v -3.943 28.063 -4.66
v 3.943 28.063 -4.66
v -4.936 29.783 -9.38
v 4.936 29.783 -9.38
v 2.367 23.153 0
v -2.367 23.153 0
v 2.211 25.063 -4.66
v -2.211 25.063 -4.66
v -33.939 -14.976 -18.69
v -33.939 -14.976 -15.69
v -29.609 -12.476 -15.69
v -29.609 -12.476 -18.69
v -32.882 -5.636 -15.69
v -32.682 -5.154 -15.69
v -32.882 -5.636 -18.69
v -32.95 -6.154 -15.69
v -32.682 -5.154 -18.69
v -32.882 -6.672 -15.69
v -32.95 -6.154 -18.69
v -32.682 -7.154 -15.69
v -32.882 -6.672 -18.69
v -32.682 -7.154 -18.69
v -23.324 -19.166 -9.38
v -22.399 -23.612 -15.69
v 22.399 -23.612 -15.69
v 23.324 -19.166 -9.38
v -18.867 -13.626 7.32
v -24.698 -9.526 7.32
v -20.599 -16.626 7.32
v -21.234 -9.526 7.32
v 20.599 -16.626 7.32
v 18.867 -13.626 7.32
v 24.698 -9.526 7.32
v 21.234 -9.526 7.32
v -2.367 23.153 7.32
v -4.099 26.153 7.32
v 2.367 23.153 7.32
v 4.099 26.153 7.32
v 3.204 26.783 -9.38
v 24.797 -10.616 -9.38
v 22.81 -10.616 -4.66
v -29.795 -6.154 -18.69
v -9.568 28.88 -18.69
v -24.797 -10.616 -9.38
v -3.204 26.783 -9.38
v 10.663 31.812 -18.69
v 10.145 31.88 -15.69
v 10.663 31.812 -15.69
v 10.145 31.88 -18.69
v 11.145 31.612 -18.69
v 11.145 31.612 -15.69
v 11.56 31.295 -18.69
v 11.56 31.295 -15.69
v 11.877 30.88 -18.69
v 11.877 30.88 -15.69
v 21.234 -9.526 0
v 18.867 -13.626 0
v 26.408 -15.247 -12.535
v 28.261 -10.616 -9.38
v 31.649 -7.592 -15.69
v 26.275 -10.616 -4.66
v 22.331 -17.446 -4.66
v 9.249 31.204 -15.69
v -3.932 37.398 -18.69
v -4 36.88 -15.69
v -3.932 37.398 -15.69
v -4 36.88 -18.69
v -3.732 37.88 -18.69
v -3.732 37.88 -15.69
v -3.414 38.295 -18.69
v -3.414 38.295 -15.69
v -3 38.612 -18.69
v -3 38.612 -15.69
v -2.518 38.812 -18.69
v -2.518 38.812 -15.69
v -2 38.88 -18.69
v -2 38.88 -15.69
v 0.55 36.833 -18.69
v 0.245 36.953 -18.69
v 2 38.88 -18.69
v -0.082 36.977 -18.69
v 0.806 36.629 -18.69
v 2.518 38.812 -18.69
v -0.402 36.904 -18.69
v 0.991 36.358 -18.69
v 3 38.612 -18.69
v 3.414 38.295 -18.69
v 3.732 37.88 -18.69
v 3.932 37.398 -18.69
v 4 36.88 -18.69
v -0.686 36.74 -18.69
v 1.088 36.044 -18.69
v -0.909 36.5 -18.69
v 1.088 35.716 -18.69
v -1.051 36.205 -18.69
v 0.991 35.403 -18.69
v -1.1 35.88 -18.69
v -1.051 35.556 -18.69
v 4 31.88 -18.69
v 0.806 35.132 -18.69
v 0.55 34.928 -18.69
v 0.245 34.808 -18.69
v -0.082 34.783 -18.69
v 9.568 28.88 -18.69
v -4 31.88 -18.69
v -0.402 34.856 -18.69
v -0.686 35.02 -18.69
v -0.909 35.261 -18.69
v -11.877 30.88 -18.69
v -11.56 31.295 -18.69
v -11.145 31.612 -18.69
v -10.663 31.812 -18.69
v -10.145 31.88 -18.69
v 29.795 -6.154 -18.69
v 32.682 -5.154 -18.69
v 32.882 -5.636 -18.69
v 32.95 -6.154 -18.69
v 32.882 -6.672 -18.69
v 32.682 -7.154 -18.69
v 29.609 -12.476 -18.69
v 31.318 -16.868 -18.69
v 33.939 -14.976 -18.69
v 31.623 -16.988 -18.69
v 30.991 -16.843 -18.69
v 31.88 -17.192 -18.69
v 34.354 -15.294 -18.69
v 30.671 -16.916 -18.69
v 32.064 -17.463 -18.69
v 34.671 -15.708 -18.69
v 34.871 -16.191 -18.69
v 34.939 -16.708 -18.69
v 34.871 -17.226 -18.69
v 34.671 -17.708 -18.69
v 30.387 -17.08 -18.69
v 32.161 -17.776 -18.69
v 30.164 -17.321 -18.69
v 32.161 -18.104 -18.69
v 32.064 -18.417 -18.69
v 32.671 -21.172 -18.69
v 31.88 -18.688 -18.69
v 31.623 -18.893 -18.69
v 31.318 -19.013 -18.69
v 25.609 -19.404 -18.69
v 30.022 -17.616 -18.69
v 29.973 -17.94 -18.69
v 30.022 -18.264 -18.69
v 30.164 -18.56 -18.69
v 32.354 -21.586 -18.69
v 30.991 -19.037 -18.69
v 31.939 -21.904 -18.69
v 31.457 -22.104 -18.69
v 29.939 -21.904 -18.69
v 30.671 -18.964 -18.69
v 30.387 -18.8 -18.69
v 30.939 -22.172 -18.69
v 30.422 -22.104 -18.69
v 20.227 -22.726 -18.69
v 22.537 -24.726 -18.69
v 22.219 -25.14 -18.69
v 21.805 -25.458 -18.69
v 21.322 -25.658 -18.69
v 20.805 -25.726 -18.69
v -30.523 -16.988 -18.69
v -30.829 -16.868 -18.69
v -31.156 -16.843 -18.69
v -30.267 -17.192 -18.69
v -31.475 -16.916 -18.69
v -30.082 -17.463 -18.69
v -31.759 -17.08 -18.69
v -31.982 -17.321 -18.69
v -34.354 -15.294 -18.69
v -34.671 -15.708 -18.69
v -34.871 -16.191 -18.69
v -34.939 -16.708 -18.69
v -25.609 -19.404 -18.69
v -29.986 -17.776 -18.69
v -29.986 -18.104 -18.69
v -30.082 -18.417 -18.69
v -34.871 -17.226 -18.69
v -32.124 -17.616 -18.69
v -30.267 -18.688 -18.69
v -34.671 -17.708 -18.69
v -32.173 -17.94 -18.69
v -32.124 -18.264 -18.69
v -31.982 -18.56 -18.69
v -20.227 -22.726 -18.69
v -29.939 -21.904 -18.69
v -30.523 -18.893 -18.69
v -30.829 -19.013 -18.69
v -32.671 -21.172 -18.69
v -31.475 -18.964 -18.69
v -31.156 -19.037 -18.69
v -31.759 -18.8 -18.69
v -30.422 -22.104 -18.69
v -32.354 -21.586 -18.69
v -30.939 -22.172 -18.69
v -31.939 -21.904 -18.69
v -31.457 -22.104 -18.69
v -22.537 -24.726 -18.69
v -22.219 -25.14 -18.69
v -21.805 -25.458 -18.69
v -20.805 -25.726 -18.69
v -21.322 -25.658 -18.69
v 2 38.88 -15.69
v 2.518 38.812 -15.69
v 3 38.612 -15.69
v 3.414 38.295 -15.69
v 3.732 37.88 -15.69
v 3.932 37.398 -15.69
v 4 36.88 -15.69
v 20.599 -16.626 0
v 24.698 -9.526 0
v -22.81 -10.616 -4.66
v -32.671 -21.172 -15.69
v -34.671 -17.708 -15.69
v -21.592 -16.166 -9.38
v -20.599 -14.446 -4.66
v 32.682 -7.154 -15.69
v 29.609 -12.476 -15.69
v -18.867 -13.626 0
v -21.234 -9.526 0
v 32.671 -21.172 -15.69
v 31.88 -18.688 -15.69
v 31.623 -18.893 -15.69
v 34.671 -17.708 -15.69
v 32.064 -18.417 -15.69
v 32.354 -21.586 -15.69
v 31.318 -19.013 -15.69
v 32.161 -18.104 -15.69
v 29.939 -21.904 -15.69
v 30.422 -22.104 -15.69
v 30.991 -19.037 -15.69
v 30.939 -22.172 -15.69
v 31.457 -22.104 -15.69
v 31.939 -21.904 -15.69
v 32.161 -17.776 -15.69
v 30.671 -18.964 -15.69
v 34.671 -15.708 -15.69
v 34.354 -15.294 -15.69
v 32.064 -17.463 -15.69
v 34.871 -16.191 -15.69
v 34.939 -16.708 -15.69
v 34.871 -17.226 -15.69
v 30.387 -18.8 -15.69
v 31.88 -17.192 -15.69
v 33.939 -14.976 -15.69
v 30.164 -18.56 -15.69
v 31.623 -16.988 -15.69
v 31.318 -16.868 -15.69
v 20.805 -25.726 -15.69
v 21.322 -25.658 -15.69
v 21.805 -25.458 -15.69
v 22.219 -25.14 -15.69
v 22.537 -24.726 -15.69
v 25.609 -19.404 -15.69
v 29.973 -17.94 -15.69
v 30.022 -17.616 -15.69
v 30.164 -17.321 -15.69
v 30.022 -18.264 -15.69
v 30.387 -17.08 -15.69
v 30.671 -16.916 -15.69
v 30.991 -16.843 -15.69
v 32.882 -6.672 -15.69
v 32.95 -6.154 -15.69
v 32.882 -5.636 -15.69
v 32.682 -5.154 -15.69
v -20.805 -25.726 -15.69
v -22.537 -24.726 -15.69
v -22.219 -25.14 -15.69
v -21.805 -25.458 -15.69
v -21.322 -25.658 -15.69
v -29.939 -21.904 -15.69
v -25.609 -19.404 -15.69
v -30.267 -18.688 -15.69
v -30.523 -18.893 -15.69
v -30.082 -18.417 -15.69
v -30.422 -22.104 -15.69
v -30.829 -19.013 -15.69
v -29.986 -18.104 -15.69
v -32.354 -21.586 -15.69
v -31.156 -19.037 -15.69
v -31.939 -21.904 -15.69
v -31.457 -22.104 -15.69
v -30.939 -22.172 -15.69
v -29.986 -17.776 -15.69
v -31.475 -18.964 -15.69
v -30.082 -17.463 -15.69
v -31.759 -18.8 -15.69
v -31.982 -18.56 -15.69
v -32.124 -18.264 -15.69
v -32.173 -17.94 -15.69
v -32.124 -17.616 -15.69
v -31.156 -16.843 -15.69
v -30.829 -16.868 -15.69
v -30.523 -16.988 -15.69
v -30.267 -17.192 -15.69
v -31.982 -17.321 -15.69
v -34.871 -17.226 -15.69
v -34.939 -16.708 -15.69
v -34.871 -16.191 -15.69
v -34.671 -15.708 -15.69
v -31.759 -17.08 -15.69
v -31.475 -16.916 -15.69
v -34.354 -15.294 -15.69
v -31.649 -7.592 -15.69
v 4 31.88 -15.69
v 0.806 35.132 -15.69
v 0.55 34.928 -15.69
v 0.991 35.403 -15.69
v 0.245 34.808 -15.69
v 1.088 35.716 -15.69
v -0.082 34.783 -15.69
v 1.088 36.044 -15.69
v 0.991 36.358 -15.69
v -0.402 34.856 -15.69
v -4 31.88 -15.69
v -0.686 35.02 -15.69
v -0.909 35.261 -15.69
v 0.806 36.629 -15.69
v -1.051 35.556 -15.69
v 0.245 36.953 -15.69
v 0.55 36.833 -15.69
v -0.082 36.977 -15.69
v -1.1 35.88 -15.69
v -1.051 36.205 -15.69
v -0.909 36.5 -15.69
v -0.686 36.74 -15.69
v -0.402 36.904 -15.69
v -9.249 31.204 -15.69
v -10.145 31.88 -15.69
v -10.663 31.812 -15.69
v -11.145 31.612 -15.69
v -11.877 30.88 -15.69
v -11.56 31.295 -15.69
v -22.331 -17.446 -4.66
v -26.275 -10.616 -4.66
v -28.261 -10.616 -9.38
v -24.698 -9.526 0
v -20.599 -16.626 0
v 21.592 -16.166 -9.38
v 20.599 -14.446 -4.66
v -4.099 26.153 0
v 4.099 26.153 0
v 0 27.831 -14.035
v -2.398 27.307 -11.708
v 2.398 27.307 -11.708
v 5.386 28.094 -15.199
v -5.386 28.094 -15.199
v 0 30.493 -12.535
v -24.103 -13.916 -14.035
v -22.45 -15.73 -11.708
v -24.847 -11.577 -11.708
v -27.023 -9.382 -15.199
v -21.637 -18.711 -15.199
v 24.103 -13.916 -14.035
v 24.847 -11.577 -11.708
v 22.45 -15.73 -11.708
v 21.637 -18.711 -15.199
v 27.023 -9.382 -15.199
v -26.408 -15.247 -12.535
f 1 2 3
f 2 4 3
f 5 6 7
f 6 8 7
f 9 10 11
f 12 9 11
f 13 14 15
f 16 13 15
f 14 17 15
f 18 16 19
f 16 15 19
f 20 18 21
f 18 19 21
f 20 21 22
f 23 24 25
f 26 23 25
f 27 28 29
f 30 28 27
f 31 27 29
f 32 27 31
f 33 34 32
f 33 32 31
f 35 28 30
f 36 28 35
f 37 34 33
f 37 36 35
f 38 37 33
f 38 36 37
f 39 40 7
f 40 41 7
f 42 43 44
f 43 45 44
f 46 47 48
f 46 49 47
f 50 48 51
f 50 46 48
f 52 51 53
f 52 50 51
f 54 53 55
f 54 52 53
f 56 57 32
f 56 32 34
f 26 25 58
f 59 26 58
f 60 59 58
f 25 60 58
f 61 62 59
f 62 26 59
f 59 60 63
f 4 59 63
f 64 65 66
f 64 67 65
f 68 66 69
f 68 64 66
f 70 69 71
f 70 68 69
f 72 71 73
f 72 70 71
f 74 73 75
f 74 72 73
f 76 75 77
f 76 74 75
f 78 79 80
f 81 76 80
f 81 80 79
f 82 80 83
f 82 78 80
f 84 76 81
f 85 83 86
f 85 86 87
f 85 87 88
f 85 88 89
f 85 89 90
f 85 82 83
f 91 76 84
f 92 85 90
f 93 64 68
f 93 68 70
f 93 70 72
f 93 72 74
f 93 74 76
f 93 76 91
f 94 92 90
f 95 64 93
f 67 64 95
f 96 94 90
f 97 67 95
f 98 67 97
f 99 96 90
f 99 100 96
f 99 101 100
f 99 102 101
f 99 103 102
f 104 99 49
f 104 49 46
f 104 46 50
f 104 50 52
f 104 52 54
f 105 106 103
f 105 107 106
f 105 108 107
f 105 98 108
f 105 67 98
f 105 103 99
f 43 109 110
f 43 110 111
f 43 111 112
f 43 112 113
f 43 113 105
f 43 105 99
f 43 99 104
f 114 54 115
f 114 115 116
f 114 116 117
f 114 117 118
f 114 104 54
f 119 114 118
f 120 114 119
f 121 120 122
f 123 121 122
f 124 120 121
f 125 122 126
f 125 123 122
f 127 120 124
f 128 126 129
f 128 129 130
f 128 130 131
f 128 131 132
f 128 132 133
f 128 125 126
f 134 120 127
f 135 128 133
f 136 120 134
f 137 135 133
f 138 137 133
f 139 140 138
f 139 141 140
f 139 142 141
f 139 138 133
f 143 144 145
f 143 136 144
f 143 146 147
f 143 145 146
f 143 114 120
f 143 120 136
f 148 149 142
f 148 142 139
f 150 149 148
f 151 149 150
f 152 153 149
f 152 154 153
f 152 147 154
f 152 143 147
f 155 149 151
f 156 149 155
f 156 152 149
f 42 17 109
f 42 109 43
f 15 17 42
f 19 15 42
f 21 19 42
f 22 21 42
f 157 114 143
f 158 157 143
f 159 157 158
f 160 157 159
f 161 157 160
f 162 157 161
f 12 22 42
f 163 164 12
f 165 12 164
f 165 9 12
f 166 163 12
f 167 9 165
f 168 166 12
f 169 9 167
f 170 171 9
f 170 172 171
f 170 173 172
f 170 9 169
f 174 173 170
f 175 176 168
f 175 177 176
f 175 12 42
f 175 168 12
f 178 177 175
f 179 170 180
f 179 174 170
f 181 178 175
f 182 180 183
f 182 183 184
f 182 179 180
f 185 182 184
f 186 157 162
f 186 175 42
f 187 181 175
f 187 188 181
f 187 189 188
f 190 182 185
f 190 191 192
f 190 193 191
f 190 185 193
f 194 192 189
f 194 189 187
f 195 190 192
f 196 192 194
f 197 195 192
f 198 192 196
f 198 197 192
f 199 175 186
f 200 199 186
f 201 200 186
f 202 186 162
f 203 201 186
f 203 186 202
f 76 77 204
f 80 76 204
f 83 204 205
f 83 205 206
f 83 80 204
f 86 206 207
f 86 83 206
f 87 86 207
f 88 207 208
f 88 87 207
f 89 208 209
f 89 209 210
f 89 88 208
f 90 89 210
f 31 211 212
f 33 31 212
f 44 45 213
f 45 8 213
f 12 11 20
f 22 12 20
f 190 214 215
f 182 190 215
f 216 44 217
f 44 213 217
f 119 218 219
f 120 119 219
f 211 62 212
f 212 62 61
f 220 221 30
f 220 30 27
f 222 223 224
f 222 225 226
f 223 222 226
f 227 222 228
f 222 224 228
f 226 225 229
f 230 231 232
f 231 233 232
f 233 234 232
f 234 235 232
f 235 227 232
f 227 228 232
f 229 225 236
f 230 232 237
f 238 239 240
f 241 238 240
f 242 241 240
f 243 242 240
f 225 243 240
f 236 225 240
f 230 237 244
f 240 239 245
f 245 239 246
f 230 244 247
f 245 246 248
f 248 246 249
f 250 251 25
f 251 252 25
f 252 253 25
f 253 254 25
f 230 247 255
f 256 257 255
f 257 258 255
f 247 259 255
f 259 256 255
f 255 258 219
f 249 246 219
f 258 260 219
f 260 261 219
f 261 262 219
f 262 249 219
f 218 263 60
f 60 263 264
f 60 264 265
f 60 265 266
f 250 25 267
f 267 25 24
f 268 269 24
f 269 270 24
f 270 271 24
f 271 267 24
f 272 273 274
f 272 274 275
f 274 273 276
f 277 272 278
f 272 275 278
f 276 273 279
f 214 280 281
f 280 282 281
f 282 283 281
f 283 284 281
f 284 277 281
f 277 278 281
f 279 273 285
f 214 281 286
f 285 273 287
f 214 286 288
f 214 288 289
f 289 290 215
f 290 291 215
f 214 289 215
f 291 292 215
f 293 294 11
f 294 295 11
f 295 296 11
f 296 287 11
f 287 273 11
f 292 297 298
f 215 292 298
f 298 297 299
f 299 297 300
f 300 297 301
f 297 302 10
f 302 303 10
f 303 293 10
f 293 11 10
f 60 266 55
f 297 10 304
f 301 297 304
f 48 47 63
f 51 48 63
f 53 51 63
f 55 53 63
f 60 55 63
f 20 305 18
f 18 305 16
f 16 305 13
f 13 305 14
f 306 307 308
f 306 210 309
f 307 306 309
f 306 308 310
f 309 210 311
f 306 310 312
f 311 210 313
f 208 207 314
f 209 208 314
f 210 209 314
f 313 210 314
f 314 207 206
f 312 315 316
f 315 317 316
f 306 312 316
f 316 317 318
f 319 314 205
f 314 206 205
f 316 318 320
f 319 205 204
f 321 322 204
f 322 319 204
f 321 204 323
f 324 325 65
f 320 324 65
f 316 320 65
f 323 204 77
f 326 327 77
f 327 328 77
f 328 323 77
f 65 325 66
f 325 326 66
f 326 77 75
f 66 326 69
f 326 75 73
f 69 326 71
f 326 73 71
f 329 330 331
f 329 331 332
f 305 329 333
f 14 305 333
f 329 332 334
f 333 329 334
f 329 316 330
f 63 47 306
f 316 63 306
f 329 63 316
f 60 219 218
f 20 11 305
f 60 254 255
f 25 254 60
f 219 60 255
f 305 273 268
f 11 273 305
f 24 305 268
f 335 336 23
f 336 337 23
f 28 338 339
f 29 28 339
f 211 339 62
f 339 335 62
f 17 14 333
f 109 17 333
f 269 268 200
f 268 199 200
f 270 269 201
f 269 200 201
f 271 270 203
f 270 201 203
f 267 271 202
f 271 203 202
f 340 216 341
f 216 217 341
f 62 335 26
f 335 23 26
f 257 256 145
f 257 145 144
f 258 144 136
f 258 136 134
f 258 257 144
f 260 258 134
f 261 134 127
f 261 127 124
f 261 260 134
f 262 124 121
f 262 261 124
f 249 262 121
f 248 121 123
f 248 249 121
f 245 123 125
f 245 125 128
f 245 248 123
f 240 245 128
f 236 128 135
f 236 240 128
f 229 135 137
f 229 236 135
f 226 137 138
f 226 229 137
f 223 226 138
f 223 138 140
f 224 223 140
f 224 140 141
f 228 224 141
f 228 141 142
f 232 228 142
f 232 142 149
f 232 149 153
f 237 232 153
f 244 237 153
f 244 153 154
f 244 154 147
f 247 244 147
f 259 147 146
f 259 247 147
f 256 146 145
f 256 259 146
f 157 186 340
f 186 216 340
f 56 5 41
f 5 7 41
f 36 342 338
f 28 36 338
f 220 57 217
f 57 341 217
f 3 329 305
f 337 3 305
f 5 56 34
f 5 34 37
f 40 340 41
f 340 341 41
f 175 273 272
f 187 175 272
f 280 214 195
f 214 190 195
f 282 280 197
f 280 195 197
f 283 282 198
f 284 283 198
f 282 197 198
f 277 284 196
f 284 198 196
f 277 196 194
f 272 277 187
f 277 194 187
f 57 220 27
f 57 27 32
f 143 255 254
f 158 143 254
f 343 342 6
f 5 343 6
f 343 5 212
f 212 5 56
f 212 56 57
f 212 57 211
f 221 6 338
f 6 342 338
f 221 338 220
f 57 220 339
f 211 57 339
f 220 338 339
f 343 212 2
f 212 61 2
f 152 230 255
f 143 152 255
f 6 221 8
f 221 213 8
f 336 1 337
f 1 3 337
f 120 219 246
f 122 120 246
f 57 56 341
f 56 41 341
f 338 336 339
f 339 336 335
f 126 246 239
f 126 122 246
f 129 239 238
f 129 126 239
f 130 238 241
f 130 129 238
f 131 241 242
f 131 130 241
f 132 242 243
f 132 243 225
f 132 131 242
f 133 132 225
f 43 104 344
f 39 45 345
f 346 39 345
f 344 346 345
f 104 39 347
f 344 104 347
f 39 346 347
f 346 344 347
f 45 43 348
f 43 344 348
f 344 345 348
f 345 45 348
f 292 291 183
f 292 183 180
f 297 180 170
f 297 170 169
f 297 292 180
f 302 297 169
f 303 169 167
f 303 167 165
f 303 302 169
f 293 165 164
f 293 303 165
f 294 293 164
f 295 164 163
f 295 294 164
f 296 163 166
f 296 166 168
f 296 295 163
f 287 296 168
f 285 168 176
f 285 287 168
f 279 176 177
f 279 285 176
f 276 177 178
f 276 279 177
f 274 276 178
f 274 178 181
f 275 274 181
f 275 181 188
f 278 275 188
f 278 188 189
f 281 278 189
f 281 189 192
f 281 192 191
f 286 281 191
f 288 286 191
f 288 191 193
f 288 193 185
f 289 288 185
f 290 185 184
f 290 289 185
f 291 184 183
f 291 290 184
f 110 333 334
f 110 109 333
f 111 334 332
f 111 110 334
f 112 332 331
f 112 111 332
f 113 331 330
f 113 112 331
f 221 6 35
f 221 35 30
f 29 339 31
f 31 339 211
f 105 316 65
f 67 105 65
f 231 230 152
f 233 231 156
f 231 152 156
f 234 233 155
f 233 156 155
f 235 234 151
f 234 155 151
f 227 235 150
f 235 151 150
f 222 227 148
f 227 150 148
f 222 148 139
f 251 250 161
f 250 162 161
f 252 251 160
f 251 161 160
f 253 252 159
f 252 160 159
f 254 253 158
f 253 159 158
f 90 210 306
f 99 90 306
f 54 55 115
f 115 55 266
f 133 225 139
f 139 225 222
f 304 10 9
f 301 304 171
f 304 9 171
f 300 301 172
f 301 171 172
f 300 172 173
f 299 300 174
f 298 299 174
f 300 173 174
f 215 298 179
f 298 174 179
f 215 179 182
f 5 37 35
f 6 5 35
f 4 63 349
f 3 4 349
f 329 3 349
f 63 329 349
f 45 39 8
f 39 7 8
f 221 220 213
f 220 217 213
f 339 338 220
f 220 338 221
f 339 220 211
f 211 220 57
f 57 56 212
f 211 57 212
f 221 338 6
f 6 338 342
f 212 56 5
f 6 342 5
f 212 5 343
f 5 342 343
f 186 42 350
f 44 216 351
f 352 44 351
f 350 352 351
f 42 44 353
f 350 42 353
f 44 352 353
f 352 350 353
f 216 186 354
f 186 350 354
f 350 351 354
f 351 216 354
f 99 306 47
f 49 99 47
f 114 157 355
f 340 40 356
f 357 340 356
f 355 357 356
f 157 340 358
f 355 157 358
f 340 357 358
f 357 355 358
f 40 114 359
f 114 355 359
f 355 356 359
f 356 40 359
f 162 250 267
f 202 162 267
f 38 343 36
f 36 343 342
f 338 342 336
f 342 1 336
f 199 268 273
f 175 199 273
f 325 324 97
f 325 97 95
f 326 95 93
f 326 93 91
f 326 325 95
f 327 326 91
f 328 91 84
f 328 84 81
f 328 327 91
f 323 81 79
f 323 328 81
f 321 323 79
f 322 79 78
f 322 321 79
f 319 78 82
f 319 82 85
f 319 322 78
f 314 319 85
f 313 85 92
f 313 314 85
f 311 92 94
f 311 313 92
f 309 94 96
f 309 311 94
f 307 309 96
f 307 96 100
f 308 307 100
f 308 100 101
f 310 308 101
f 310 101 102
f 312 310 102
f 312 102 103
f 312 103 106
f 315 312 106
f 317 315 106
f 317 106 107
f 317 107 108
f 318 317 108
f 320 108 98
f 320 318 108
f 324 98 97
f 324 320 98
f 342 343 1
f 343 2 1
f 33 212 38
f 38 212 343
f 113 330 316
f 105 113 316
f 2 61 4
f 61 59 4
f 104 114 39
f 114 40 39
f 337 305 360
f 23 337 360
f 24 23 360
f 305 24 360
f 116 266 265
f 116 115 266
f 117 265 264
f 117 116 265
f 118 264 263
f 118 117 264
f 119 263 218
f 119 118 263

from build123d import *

# Parameters (mm, degrees)
BOSS_EXTRUDE1_DEPTH     = 7.32
BOSS_EXTRUDE6_START     = -3
BOSS_EXTRUDE6_OUTLINE_R = 1.1
BOSS_EXTRUDE6_DEPTH     = 3
FILLET2_R               = 2


# Read off the part's stored shape, not the designer's step: Boss-Extrude6
with BuildPart() as part:
    # Sketch1 → Boss-Extrude1 (new body)
    with BuildSketch(Plane.XY):
        Polygon((-20.599186911, -16.626279442), (20.599186911, -16.626279442), (24.698373822, -9.526279442), (4.099186911, 26.152558883), (-4.099186911, 26.152558883), (-24.698373822, -9.526279442), align=None)
        Polygon((18.867136104, -13.626279442), (21.234272207, -9.526279442), (2.367136104, 23.152558883), (-2.367136104, 23.152558883), (-21.234272207, -9.526279442), (-18.867136104, -13.626279442), align=None, mode=Mode.SUBTRACT)
    extrude(amount=BOSS_EXTRUDE1_DEPTH)


with BuildPart() as body_2:
    # Sketch1<14> → Loft3 section 0
    with BuildSketch(Plane.XY):
        with BuildLine():
            Line((-4.099186911, 26.152558883), (-24.698373822, -9.526279442))
            Line((-24.698373822, -9.526279442), (-20.599186911, -16.626279442))
            Line((-20.599186911, -16.626279442), (20.599186911, -16.626279442))
            Line((20.599186911, -16.626279442), (24.698373822, -9.526279442))
            Line((24.698373822, -9.526279442), (4.099186911, 26.152558883))
            Line((4.099186911, 26.152558883), (-4.099186911, 26.152558883))
        make_face()
    # Sketch5 → Loft3 section 1
    with BuildSketch(Plane.XY.offset(-4.66)):
        with BuildLine():
            Line((-3.943302339, 28.062558883), (-26.274540057, -10.616279442))
            Line((-26.274540057, -10.616279442), (-22.331237719, -17.446279442))
            Line((-22.331237719, -17.446279442), (22.331237719, -17.446279442))
            Line((22.331237719, -17.446279442), (26.274540057, -10.616279442))
            Line((26.274540057, -10.616279442), (3.943302339, 28.062558883))
            Line((3.943302339, 28.062558883), (-3.943302339, 28.062558883))
        make_face()
    loft()

    # Sketch5<46> → Loft4 section 0
    with BuildSketch(Plane.XY.offset(-4.66)):
        with BuildLine():
            Line((-3.943302339, 28.062558883), (-26.274540057, -10.616279442))
            Line((-26.274540057, -10.616279442), (-22.331237719, -17.446279442))
            Line((-22.331237719, -17.446279442), (22.331237719, -17.446279442))
            Line((22.331237719, -17.446279442), (26.274540057, -10.616279442))
            Line((26.274540057, -10.616279442), (3.943302339, 28.062558883))
            Line((3.943302339, 28.062558883), (-3.943302339, 28.062558883))
        make_face()
    # Sketch13 → Loft4 section 1
    with BuildSketch(Plane.XY.offset(-9.38)):
        with BuildLine():
            Line((-4.936344802, 29.782558883), (-28.260624983, -10.616279442))
            Line((-28.260624983, -10.616279442), (-23.324280182, -19.166279442))
            Line((-23.324280182, -19.166279442), (23.324280182, -19.166279442))
            Line((23.324280182, -19.166279442), (28.260624983, -10.616279442))
            Line((28.260624983, -10.616279442), (4.936344802, 29.782558883))
            Line((4.936344802, 29.782558883), (-4.936344802, 29.782558883))
        make_face()
    loft()

    # Sketch13<4> → Loft5 section 0
    with BuildSketch(Plane.XY.offset(-9.38)):
        with BuildLine():
            Line((-4.936344802, 29.782558883), (-28.260624983, -10.616279442))
            Line((-28.260624983, -10.616279442), (-23.324280182, -19.166279442))
            Line((-23.324280182, -19.166279442), (23.324280182, -19.166279442))
            Line((23.324280182, -19.166279442), (28.260624983, -10.616279442))
            Line((28.260624983, -10.616279442), (4.936344802, 29.782558883))
            Line((4.936344802, 29.782558883), (-4.936344802, 29.782558883))
        make_face()
    # Sketch14 → Loft5 section 1
    with BuildSketch(Plane.XY.offset(-18.69)):
        with BuildLine():
            Line((11.3, 31.880384758), (-11.3, 31.880384758))
            Line((-11.3, 31.880384758), (-33.259223083, -6.154105316))
            Line((-33.259223083, -6.154105316), (-21.959223083, -25.726279442))
            Line((-21.959223083, -25.726279442), (21.959223083, -25.726279442))
            Line((21.959223083, -25.726279442), (33.259223083, -6.154105316))
            Line((33.259223083, -6.154105316), (11.3, 31.880384758))
        make_face()
    loft()

    # Sketch1<15> → Cut-Loft1 section 0
    with BuildSketch(Plane.XY):
        with BuildLine():
            Line((-2.367136104, 23.152558883), (2.367136104, 23.152558883))
            Line((2.367136104, 23.152558883), (21.234272207, -9.526279442))
            Line((21.234272207, -9.526279442), (18.867136104, -13.626279442))
            Line((18.867136104, -13.626279442), (-18.867136104, -13.626279442))
            Line((-18.867136104, -13.626279442), (-21.234272207, -9.526279442))
            Line((-21.234272207, -9.526279442), (-2.367136104, 23.152558883))
        make_face()
    # Sketch5<47> → Cut-Loft1 section 1
    with BuildSketch(Plane.XY.offset(-4.66)):
        with BuildLine():
            Line((2.211251531, 25.062558883), (22.810438442, -10.616279442))
            Line((22.810438442, -10.616279442), (20.599186911, -14.446279442))
            Line((20.599186911, -14.446279442), (-20.599186911, -14.446279442))
            Line((-20.599186911, -14.446279442), (-22.810438442, -10.616279442))
            Line((-22.810438442, -10.616279442), (-2.211251531, 25.062558883))
            Line((-2.211251531, 25.062558883), (2.211251531, 25.062558883))
        make_face()
    loft(mode=Mode.SUBTRACT)

    # Sketch14<5> → Cut-Loft2 section 0
    with BuildSketch(Plane.XY.offset(-18.69)):
        with BuildLine():
            Line((29.795121467, -6.154105316), (9.567949192, 28.880384758))
            Line((9.567949192, 28.880384758), (-9.567949192, 28.880384758))
            Line((-9.567949192, 28.880384758), (-29.795121467, -6.154105316))
            Line((-29.795121467, -6.154105316), (-20.227172275, -22.726279442))
            Line((-20.227172275, -22.726279442), (20.227172275, -22.726279442))
            Line((20.227172275, -22.726279442), (29.795121467, -6.154105316))
        make_face()
    # Sketch13<5> → Cut-Loft2 section 1
    with BuildSketch(Plane.XY.offset(-9.38)):
        with BuildLine():
            Line((-24.796523368, -10.616279442), (-21.592229374, -16.166279442))
            Line((-21.592229374, -16.166279442), (21.592229374, -16.166279442))
            Line((21.592229374, -16.166279442), (24.796523368, -10.616279442))
            Line((24.796523368, -10.616279442), (3.204293994, 26.782558883))
            Line((3.204293994, 26.782558883), (-3.204293994, 26.782558883))
            Line((-3.204293994, 26.782558883), (-24.796523368, -10.616279442))
        make_face()
    loft(mode=Mode.SUBTRACT)

    # Sketch13<6> → Cut-Loft3 section 0
    with BuildSketch(Plane.XY.offset(-9.38)):
        with BuildLine():
            Line((-24.796523368, -10.616279442), (-21.592229374, -16.166279442))
            Line((-21.592229374, -16.166279442), (21.592229374, -16.166279442))
            Line((21.592229374, -16.166279442), (24.796523368, -10.616279442))
            Line((24.796523368, -10.616279442), (3.204293994, 26.782558883))
            Line((3.204293994, 26.782558883), (-3.204293994, 26.782558883))
            Line((-3.204293994, 26.782558883), (-24.796523368, -10.616279442))
        make_face()
    # Sketch5<48> → Cut-Loft3 section 1
    with BuildSketch(Plane.XY.offset(-4.66)):
        with BuildLine():
            Line((2.211251531, 25.062558883), (22.810438442, -10.616279442))
            Line((22.810438442, -10.616279442), (20.599186911, -14.446279442))
            Line((20.599186911, -14.446279442), (-20.599186911, -14.446279442))
            Line((-20.599186911, -14.446279442), (-22.810438442, -10.616279442))
            Line((-22.810438442, -10.616279442), (-2.211251531, 25.062558883))
            Line((-2.211251531, 25.062558883), (2.211251531, 25.062558883))
        make_face()
    loft(mode=Mode.SUBTRACT)

    # Boss-Extrude6 outline → Boss-Extrude6 (add)
    with BuildSketch(Plane(origin=(0, 0, -18.69), x_dir=(-1, 0, 0), z_dir=(0, 0, -1)).offset(BOSS_EXTRUDE6_START)):
        Polygon((33.259223083, -6.154105316), (11.3, 31.880384758), (4, 31.880384758), (4, 38.880384758), (-4, 38.880384758), (-4, 31.880384758), (-11.3, 31.880384758), (-33.259223083, -6.154105316), (-29.609223083, -12.476090764), (-35.671400909, -15.976090764), (-31.671400909, -22.904293994), (-25.609223083, -19.404293994), (-21.959223083, -25.726279442), (21.959223083, -25.726279442), (25.609223083, -19.404293994), (31.671400909, -22.904293994), (35.671400909, -15.976090764), (29.609223083, -12.476090764), align=None)
        Polygon((-20.227172275, -22.726279442), (-29.795121467, -6.154105316), (-9.567949192, 28.880384758), (9.567949192, 28.880384758), (29.795121467, -6.154105316), (20.227172275, -22.726279442), align=None, mode=Mode.SUBTRACT)
        with Locations((31.073324698, -17.940192379)):
            Circle(BOSS_EXTRUDE6_OUTLINE_R, mode=Mode.SUBTRACT)
        with Locations((-31.073324698, -17.940192379)):
            Circle(BOSS_EXTRUDE6_OUTLINE_R, mode=Mode.SUBTRACT)
        with Locations((0, 35.880384758)):
            Circle(BOSS_EXTRUDE6_OUTLINE_R, mode=Mode.SUBTRACT)
    extrude(amount=BOSS_EXTRUDE6_DEPTH)

    # Fillet2
    fillet2_edges = [body_2.edges().sort_by_distance(p)[0] for p in [
        (-11.3, 31.880384758, -17.19),
        (-33.259223083, -6.154105316, -17.19),
        (-35.671400909, -15.976090764, -17.19),
        (-31.671400909, -22.904293994, -17.19),
        (-21.959223083, -25.726279442, -17.19),
        (21.959223083, -25.726279442, -17.19),
        (31.671400909, -22.904293994, -17.19),
        (35.671400909, -15.976090764, -17.19),
        (33.259223083, -6.154105316, -17.19),
        (11.3, 31.880384758, -17.19),
        (4, 38.880384758, -17.19),
        (-4, 38.880384758, -17.19),
    ]]
    fillet(fillet2_edges, radius=FILLET2_R)


solid = Compound([part.part, body_2.part])
